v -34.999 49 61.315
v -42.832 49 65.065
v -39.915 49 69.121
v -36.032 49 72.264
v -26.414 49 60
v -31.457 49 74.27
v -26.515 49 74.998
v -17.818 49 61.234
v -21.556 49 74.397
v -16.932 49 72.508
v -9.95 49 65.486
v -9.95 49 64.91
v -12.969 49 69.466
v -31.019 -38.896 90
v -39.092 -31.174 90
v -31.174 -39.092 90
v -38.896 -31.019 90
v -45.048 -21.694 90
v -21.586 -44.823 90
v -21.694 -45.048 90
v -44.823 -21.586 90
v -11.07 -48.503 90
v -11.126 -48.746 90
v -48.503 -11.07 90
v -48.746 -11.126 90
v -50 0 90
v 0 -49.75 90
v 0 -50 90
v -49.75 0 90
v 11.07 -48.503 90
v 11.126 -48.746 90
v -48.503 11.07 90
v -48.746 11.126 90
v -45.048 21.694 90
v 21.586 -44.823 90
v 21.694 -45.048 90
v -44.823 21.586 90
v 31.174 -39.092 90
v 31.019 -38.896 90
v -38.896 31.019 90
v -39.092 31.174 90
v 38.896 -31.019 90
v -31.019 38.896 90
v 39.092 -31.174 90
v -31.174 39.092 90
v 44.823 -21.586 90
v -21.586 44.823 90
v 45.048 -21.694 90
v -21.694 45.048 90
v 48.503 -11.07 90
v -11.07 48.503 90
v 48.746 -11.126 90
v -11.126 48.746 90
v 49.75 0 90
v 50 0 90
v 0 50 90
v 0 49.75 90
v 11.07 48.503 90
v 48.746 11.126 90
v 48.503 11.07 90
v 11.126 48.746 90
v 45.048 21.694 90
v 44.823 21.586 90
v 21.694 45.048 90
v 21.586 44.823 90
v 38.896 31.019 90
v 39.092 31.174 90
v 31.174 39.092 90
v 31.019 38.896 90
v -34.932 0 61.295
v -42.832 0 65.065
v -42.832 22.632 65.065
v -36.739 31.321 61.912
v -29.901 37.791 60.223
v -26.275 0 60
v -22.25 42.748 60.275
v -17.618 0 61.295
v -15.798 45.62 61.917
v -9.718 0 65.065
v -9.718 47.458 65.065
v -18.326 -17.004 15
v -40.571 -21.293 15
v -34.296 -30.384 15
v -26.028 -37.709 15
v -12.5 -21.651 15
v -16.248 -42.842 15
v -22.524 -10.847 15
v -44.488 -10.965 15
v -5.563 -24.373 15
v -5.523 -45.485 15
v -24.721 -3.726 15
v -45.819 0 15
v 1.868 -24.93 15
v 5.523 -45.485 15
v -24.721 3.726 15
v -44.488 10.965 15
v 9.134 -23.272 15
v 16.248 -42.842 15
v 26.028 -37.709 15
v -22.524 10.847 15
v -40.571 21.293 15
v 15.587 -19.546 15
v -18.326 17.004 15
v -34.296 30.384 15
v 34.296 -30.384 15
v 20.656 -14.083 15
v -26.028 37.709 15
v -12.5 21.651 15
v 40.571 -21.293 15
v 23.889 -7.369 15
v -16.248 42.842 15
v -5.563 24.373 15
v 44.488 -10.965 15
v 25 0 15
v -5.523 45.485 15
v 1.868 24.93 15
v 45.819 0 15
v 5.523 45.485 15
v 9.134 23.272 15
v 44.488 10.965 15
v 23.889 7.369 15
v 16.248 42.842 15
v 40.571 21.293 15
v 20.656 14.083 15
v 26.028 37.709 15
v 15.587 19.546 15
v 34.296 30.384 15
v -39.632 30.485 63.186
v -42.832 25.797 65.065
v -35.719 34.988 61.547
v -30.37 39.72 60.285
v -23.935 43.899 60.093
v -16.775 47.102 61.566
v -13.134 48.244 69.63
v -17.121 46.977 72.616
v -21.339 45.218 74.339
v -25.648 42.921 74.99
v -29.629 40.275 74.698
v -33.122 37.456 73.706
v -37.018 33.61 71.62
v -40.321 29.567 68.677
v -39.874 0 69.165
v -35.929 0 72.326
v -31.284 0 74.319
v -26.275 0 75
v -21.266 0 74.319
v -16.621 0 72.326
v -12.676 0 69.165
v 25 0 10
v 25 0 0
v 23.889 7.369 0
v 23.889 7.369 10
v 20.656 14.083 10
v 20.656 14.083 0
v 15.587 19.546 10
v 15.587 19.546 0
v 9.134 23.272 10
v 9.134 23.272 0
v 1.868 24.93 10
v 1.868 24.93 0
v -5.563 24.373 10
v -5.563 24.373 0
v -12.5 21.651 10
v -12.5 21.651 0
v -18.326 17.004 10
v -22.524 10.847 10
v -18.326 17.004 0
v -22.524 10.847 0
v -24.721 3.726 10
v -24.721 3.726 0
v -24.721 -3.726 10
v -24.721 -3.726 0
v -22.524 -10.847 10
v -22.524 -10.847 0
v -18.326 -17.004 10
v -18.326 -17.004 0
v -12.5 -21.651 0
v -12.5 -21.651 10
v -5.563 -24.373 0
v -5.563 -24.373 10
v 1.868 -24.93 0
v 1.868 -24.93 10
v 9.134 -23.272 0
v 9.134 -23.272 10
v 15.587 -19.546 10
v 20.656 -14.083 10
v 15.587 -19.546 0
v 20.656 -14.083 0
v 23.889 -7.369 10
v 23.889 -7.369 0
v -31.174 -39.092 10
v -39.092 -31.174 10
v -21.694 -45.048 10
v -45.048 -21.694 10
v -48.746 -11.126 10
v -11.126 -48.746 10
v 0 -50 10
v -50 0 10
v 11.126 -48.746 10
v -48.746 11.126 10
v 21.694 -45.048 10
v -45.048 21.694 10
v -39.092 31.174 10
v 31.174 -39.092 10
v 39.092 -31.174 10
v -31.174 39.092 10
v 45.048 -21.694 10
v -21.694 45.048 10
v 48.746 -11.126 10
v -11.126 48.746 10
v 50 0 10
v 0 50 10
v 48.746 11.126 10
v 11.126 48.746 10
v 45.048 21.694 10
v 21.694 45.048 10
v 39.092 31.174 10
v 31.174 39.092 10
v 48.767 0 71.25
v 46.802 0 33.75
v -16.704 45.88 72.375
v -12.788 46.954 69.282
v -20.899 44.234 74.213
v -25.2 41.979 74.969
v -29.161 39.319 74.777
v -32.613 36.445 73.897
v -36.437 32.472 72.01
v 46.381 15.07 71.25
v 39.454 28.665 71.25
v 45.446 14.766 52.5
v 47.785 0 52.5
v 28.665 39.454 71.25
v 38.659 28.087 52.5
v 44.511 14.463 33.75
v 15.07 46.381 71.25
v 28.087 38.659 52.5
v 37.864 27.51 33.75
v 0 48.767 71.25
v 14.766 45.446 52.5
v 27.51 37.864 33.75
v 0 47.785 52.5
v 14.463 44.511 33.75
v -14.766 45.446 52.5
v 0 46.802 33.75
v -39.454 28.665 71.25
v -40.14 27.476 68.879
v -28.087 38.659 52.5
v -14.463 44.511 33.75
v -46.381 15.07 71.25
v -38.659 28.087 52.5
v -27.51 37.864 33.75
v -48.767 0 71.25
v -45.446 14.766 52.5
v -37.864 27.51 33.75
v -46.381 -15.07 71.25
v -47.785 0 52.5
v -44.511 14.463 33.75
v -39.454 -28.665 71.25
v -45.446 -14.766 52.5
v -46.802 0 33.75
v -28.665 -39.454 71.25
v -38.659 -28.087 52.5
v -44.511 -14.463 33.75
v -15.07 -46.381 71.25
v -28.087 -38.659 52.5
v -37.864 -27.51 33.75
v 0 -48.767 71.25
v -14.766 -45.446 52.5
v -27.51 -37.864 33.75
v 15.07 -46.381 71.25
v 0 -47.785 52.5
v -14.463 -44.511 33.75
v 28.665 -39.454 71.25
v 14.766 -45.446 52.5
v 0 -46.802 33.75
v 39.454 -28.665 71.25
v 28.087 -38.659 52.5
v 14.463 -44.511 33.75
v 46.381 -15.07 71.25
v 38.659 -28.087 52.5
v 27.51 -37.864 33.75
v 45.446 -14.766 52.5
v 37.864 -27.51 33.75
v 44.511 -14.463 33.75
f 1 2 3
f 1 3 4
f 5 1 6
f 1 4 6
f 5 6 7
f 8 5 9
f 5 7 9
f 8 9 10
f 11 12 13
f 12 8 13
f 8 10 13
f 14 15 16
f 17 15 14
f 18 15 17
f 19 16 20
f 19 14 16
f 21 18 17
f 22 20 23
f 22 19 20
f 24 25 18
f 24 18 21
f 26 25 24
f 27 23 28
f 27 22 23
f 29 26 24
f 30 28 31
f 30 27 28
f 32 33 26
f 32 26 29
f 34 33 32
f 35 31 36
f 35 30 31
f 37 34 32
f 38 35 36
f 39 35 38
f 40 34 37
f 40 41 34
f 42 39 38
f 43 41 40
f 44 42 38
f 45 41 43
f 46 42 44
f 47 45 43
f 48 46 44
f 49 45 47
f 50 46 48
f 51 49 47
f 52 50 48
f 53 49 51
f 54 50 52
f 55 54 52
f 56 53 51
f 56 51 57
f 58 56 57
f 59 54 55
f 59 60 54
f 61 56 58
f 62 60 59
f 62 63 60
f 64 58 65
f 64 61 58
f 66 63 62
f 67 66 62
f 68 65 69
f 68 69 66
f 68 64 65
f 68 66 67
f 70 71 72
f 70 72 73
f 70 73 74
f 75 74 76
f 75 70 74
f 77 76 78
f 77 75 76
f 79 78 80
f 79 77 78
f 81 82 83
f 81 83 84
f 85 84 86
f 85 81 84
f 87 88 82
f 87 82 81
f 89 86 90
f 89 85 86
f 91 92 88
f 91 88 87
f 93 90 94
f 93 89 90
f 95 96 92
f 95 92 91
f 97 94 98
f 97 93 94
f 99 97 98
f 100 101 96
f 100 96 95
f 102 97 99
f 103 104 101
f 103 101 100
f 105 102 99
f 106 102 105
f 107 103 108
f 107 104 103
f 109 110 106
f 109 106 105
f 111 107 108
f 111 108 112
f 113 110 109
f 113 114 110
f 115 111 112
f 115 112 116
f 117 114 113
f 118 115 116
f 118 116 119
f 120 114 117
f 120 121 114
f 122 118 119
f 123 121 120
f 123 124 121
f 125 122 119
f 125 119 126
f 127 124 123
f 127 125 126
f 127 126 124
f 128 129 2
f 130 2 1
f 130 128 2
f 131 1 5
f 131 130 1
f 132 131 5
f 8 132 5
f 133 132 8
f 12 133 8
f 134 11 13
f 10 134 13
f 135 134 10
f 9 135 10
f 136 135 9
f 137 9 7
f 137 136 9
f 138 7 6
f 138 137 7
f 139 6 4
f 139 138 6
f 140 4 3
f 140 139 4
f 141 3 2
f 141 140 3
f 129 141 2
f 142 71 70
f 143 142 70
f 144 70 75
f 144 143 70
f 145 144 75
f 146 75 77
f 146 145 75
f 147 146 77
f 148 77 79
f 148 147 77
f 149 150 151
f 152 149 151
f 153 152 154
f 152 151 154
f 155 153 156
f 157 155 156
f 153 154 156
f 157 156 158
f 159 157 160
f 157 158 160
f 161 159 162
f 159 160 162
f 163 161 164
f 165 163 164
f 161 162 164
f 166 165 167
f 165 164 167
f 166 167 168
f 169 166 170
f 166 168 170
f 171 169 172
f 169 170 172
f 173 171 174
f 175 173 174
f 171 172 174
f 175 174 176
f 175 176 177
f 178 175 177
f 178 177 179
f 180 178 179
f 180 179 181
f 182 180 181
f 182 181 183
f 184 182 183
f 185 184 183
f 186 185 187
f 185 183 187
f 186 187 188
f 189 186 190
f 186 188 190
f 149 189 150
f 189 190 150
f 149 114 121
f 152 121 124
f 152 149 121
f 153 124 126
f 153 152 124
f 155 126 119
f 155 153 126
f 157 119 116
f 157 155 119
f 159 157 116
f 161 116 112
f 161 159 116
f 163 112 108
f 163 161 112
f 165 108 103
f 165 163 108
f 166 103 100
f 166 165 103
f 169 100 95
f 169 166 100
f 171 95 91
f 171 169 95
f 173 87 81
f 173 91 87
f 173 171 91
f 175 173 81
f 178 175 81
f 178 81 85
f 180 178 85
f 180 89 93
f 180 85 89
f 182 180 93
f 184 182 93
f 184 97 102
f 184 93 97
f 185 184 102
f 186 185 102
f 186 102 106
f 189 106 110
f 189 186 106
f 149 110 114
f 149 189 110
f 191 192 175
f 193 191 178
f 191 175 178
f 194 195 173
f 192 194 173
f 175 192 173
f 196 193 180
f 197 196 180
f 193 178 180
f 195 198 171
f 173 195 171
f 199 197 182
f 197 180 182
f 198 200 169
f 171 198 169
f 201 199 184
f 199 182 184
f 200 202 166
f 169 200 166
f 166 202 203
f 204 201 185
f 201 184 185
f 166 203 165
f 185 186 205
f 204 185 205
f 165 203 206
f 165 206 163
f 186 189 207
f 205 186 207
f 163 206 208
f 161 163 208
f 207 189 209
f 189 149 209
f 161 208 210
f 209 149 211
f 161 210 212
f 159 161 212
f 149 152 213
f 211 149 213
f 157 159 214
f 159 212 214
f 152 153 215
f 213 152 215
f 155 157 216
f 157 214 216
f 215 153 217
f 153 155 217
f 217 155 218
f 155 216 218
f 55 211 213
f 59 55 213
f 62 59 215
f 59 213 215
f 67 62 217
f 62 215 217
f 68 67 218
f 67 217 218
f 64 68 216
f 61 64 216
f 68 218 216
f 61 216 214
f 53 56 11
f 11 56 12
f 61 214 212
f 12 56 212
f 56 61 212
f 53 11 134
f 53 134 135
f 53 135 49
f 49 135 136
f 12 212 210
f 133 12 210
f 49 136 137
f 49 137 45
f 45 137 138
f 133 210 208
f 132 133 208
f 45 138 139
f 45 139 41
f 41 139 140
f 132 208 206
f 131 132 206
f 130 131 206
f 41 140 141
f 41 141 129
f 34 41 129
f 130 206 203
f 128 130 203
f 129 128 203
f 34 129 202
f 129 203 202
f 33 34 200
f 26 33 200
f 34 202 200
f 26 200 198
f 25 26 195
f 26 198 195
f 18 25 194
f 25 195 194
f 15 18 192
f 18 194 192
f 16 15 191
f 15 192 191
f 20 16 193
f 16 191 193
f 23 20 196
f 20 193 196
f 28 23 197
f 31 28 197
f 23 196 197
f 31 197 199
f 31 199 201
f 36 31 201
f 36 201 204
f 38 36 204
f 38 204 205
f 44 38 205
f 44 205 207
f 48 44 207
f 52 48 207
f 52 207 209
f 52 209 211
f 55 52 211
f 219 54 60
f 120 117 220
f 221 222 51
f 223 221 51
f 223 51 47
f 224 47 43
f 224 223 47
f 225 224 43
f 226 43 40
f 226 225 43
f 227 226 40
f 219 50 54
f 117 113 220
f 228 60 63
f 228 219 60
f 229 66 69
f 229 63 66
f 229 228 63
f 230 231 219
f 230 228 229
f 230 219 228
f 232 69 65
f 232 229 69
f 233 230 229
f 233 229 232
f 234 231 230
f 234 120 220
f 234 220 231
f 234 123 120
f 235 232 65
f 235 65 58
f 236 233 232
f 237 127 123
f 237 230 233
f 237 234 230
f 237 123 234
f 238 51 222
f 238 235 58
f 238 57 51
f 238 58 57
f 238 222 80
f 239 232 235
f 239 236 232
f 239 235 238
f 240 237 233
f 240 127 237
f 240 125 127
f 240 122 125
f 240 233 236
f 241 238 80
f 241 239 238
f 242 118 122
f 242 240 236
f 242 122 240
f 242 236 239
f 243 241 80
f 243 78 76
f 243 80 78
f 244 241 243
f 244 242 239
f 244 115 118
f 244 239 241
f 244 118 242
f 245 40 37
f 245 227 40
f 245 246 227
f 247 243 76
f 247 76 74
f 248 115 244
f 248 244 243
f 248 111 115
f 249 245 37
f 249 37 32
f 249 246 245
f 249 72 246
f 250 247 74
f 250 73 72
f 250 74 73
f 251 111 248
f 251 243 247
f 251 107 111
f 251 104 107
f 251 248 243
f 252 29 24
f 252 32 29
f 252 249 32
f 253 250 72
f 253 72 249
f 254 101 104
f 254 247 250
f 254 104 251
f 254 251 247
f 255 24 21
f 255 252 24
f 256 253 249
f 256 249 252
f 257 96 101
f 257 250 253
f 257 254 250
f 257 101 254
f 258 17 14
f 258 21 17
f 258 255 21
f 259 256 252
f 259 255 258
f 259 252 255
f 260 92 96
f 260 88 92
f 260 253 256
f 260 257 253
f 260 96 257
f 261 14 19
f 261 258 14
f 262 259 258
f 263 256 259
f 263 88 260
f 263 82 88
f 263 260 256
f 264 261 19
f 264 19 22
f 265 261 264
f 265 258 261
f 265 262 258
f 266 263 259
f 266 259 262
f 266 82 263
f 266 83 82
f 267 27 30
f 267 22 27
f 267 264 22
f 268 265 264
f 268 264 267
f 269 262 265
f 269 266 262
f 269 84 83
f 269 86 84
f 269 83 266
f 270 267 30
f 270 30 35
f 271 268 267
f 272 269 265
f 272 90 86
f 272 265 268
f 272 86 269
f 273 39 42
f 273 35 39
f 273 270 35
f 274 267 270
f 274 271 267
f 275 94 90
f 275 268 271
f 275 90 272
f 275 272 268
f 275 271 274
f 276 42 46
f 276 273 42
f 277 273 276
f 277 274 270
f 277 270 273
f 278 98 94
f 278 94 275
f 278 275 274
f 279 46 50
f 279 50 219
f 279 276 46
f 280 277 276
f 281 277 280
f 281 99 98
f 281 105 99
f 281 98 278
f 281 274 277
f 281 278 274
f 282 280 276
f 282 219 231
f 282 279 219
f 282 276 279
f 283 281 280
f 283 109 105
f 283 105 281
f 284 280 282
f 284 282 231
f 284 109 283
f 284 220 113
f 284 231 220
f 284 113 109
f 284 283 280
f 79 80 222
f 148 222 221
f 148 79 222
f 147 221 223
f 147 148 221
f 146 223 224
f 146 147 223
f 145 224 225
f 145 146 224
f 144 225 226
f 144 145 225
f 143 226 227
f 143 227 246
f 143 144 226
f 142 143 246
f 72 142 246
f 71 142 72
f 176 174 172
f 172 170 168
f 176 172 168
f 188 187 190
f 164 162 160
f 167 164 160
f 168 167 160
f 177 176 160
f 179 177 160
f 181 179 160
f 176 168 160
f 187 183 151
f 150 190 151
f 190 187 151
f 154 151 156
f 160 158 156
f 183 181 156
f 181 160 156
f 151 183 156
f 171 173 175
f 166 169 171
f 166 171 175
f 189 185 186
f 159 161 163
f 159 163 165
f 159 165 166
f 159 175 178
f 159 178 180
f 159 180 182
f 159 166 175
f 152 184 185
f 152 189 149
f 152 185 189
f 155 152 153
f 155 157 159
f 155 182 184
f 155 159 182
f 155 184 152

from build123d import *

# Parameters (mm, degrees)
F0_R     = 25
F1_DEPTH = 10
F2_R     = 50
F2_R_2   = 25
F3_DEPTH = 80
F4_R     = 49.75
F5_DEPTH = 75
F5_TAPER = 3
F7_DEPTH = 49


with BuildPart() as f1:
    # F0 (on Top) → F1 (new body)
    with BuildSketch(Plane.XY):
        Circle(F0_R)
    extrude(amount=F1_DEPTH)


with BuildPart() as f3:
    # F2 (on face) → F3 (new body)
    with BuildSketch(Plane.XY.offset(10)):
        Circle(F2_R)
        Circle(F2_R_2, mode=Mode.SUBTRACT)
    extrude(amount=F3_DEPTH)

    # F4 (on face) → F5 (cut)
    with BuildSketch(Plane.XY.offset(90)):
        Circle(F4_R)
    extrude(amount=-F5_DEPTH, taper=F5_TAPER, mode=Mode.SUBTRACT)

    # F6 (on Front) → F7 (join)
    with BuildSketch(Plane.XZ):
        with BuildLine():
            ThreePointArc((-9.7182350287, 65.0651815314), (-26.274882257, 75), (-42.8315294853, 65.0651815314))
            ThreePointArc((-42.8315294853, 65.0651815314), (-26.274882257, 60), (-9.7182350287, 65.0651815314))
        make_face()
    extrude(amount=-F7_DEPTH)


solid = Compound([f1.part, f3.part])
